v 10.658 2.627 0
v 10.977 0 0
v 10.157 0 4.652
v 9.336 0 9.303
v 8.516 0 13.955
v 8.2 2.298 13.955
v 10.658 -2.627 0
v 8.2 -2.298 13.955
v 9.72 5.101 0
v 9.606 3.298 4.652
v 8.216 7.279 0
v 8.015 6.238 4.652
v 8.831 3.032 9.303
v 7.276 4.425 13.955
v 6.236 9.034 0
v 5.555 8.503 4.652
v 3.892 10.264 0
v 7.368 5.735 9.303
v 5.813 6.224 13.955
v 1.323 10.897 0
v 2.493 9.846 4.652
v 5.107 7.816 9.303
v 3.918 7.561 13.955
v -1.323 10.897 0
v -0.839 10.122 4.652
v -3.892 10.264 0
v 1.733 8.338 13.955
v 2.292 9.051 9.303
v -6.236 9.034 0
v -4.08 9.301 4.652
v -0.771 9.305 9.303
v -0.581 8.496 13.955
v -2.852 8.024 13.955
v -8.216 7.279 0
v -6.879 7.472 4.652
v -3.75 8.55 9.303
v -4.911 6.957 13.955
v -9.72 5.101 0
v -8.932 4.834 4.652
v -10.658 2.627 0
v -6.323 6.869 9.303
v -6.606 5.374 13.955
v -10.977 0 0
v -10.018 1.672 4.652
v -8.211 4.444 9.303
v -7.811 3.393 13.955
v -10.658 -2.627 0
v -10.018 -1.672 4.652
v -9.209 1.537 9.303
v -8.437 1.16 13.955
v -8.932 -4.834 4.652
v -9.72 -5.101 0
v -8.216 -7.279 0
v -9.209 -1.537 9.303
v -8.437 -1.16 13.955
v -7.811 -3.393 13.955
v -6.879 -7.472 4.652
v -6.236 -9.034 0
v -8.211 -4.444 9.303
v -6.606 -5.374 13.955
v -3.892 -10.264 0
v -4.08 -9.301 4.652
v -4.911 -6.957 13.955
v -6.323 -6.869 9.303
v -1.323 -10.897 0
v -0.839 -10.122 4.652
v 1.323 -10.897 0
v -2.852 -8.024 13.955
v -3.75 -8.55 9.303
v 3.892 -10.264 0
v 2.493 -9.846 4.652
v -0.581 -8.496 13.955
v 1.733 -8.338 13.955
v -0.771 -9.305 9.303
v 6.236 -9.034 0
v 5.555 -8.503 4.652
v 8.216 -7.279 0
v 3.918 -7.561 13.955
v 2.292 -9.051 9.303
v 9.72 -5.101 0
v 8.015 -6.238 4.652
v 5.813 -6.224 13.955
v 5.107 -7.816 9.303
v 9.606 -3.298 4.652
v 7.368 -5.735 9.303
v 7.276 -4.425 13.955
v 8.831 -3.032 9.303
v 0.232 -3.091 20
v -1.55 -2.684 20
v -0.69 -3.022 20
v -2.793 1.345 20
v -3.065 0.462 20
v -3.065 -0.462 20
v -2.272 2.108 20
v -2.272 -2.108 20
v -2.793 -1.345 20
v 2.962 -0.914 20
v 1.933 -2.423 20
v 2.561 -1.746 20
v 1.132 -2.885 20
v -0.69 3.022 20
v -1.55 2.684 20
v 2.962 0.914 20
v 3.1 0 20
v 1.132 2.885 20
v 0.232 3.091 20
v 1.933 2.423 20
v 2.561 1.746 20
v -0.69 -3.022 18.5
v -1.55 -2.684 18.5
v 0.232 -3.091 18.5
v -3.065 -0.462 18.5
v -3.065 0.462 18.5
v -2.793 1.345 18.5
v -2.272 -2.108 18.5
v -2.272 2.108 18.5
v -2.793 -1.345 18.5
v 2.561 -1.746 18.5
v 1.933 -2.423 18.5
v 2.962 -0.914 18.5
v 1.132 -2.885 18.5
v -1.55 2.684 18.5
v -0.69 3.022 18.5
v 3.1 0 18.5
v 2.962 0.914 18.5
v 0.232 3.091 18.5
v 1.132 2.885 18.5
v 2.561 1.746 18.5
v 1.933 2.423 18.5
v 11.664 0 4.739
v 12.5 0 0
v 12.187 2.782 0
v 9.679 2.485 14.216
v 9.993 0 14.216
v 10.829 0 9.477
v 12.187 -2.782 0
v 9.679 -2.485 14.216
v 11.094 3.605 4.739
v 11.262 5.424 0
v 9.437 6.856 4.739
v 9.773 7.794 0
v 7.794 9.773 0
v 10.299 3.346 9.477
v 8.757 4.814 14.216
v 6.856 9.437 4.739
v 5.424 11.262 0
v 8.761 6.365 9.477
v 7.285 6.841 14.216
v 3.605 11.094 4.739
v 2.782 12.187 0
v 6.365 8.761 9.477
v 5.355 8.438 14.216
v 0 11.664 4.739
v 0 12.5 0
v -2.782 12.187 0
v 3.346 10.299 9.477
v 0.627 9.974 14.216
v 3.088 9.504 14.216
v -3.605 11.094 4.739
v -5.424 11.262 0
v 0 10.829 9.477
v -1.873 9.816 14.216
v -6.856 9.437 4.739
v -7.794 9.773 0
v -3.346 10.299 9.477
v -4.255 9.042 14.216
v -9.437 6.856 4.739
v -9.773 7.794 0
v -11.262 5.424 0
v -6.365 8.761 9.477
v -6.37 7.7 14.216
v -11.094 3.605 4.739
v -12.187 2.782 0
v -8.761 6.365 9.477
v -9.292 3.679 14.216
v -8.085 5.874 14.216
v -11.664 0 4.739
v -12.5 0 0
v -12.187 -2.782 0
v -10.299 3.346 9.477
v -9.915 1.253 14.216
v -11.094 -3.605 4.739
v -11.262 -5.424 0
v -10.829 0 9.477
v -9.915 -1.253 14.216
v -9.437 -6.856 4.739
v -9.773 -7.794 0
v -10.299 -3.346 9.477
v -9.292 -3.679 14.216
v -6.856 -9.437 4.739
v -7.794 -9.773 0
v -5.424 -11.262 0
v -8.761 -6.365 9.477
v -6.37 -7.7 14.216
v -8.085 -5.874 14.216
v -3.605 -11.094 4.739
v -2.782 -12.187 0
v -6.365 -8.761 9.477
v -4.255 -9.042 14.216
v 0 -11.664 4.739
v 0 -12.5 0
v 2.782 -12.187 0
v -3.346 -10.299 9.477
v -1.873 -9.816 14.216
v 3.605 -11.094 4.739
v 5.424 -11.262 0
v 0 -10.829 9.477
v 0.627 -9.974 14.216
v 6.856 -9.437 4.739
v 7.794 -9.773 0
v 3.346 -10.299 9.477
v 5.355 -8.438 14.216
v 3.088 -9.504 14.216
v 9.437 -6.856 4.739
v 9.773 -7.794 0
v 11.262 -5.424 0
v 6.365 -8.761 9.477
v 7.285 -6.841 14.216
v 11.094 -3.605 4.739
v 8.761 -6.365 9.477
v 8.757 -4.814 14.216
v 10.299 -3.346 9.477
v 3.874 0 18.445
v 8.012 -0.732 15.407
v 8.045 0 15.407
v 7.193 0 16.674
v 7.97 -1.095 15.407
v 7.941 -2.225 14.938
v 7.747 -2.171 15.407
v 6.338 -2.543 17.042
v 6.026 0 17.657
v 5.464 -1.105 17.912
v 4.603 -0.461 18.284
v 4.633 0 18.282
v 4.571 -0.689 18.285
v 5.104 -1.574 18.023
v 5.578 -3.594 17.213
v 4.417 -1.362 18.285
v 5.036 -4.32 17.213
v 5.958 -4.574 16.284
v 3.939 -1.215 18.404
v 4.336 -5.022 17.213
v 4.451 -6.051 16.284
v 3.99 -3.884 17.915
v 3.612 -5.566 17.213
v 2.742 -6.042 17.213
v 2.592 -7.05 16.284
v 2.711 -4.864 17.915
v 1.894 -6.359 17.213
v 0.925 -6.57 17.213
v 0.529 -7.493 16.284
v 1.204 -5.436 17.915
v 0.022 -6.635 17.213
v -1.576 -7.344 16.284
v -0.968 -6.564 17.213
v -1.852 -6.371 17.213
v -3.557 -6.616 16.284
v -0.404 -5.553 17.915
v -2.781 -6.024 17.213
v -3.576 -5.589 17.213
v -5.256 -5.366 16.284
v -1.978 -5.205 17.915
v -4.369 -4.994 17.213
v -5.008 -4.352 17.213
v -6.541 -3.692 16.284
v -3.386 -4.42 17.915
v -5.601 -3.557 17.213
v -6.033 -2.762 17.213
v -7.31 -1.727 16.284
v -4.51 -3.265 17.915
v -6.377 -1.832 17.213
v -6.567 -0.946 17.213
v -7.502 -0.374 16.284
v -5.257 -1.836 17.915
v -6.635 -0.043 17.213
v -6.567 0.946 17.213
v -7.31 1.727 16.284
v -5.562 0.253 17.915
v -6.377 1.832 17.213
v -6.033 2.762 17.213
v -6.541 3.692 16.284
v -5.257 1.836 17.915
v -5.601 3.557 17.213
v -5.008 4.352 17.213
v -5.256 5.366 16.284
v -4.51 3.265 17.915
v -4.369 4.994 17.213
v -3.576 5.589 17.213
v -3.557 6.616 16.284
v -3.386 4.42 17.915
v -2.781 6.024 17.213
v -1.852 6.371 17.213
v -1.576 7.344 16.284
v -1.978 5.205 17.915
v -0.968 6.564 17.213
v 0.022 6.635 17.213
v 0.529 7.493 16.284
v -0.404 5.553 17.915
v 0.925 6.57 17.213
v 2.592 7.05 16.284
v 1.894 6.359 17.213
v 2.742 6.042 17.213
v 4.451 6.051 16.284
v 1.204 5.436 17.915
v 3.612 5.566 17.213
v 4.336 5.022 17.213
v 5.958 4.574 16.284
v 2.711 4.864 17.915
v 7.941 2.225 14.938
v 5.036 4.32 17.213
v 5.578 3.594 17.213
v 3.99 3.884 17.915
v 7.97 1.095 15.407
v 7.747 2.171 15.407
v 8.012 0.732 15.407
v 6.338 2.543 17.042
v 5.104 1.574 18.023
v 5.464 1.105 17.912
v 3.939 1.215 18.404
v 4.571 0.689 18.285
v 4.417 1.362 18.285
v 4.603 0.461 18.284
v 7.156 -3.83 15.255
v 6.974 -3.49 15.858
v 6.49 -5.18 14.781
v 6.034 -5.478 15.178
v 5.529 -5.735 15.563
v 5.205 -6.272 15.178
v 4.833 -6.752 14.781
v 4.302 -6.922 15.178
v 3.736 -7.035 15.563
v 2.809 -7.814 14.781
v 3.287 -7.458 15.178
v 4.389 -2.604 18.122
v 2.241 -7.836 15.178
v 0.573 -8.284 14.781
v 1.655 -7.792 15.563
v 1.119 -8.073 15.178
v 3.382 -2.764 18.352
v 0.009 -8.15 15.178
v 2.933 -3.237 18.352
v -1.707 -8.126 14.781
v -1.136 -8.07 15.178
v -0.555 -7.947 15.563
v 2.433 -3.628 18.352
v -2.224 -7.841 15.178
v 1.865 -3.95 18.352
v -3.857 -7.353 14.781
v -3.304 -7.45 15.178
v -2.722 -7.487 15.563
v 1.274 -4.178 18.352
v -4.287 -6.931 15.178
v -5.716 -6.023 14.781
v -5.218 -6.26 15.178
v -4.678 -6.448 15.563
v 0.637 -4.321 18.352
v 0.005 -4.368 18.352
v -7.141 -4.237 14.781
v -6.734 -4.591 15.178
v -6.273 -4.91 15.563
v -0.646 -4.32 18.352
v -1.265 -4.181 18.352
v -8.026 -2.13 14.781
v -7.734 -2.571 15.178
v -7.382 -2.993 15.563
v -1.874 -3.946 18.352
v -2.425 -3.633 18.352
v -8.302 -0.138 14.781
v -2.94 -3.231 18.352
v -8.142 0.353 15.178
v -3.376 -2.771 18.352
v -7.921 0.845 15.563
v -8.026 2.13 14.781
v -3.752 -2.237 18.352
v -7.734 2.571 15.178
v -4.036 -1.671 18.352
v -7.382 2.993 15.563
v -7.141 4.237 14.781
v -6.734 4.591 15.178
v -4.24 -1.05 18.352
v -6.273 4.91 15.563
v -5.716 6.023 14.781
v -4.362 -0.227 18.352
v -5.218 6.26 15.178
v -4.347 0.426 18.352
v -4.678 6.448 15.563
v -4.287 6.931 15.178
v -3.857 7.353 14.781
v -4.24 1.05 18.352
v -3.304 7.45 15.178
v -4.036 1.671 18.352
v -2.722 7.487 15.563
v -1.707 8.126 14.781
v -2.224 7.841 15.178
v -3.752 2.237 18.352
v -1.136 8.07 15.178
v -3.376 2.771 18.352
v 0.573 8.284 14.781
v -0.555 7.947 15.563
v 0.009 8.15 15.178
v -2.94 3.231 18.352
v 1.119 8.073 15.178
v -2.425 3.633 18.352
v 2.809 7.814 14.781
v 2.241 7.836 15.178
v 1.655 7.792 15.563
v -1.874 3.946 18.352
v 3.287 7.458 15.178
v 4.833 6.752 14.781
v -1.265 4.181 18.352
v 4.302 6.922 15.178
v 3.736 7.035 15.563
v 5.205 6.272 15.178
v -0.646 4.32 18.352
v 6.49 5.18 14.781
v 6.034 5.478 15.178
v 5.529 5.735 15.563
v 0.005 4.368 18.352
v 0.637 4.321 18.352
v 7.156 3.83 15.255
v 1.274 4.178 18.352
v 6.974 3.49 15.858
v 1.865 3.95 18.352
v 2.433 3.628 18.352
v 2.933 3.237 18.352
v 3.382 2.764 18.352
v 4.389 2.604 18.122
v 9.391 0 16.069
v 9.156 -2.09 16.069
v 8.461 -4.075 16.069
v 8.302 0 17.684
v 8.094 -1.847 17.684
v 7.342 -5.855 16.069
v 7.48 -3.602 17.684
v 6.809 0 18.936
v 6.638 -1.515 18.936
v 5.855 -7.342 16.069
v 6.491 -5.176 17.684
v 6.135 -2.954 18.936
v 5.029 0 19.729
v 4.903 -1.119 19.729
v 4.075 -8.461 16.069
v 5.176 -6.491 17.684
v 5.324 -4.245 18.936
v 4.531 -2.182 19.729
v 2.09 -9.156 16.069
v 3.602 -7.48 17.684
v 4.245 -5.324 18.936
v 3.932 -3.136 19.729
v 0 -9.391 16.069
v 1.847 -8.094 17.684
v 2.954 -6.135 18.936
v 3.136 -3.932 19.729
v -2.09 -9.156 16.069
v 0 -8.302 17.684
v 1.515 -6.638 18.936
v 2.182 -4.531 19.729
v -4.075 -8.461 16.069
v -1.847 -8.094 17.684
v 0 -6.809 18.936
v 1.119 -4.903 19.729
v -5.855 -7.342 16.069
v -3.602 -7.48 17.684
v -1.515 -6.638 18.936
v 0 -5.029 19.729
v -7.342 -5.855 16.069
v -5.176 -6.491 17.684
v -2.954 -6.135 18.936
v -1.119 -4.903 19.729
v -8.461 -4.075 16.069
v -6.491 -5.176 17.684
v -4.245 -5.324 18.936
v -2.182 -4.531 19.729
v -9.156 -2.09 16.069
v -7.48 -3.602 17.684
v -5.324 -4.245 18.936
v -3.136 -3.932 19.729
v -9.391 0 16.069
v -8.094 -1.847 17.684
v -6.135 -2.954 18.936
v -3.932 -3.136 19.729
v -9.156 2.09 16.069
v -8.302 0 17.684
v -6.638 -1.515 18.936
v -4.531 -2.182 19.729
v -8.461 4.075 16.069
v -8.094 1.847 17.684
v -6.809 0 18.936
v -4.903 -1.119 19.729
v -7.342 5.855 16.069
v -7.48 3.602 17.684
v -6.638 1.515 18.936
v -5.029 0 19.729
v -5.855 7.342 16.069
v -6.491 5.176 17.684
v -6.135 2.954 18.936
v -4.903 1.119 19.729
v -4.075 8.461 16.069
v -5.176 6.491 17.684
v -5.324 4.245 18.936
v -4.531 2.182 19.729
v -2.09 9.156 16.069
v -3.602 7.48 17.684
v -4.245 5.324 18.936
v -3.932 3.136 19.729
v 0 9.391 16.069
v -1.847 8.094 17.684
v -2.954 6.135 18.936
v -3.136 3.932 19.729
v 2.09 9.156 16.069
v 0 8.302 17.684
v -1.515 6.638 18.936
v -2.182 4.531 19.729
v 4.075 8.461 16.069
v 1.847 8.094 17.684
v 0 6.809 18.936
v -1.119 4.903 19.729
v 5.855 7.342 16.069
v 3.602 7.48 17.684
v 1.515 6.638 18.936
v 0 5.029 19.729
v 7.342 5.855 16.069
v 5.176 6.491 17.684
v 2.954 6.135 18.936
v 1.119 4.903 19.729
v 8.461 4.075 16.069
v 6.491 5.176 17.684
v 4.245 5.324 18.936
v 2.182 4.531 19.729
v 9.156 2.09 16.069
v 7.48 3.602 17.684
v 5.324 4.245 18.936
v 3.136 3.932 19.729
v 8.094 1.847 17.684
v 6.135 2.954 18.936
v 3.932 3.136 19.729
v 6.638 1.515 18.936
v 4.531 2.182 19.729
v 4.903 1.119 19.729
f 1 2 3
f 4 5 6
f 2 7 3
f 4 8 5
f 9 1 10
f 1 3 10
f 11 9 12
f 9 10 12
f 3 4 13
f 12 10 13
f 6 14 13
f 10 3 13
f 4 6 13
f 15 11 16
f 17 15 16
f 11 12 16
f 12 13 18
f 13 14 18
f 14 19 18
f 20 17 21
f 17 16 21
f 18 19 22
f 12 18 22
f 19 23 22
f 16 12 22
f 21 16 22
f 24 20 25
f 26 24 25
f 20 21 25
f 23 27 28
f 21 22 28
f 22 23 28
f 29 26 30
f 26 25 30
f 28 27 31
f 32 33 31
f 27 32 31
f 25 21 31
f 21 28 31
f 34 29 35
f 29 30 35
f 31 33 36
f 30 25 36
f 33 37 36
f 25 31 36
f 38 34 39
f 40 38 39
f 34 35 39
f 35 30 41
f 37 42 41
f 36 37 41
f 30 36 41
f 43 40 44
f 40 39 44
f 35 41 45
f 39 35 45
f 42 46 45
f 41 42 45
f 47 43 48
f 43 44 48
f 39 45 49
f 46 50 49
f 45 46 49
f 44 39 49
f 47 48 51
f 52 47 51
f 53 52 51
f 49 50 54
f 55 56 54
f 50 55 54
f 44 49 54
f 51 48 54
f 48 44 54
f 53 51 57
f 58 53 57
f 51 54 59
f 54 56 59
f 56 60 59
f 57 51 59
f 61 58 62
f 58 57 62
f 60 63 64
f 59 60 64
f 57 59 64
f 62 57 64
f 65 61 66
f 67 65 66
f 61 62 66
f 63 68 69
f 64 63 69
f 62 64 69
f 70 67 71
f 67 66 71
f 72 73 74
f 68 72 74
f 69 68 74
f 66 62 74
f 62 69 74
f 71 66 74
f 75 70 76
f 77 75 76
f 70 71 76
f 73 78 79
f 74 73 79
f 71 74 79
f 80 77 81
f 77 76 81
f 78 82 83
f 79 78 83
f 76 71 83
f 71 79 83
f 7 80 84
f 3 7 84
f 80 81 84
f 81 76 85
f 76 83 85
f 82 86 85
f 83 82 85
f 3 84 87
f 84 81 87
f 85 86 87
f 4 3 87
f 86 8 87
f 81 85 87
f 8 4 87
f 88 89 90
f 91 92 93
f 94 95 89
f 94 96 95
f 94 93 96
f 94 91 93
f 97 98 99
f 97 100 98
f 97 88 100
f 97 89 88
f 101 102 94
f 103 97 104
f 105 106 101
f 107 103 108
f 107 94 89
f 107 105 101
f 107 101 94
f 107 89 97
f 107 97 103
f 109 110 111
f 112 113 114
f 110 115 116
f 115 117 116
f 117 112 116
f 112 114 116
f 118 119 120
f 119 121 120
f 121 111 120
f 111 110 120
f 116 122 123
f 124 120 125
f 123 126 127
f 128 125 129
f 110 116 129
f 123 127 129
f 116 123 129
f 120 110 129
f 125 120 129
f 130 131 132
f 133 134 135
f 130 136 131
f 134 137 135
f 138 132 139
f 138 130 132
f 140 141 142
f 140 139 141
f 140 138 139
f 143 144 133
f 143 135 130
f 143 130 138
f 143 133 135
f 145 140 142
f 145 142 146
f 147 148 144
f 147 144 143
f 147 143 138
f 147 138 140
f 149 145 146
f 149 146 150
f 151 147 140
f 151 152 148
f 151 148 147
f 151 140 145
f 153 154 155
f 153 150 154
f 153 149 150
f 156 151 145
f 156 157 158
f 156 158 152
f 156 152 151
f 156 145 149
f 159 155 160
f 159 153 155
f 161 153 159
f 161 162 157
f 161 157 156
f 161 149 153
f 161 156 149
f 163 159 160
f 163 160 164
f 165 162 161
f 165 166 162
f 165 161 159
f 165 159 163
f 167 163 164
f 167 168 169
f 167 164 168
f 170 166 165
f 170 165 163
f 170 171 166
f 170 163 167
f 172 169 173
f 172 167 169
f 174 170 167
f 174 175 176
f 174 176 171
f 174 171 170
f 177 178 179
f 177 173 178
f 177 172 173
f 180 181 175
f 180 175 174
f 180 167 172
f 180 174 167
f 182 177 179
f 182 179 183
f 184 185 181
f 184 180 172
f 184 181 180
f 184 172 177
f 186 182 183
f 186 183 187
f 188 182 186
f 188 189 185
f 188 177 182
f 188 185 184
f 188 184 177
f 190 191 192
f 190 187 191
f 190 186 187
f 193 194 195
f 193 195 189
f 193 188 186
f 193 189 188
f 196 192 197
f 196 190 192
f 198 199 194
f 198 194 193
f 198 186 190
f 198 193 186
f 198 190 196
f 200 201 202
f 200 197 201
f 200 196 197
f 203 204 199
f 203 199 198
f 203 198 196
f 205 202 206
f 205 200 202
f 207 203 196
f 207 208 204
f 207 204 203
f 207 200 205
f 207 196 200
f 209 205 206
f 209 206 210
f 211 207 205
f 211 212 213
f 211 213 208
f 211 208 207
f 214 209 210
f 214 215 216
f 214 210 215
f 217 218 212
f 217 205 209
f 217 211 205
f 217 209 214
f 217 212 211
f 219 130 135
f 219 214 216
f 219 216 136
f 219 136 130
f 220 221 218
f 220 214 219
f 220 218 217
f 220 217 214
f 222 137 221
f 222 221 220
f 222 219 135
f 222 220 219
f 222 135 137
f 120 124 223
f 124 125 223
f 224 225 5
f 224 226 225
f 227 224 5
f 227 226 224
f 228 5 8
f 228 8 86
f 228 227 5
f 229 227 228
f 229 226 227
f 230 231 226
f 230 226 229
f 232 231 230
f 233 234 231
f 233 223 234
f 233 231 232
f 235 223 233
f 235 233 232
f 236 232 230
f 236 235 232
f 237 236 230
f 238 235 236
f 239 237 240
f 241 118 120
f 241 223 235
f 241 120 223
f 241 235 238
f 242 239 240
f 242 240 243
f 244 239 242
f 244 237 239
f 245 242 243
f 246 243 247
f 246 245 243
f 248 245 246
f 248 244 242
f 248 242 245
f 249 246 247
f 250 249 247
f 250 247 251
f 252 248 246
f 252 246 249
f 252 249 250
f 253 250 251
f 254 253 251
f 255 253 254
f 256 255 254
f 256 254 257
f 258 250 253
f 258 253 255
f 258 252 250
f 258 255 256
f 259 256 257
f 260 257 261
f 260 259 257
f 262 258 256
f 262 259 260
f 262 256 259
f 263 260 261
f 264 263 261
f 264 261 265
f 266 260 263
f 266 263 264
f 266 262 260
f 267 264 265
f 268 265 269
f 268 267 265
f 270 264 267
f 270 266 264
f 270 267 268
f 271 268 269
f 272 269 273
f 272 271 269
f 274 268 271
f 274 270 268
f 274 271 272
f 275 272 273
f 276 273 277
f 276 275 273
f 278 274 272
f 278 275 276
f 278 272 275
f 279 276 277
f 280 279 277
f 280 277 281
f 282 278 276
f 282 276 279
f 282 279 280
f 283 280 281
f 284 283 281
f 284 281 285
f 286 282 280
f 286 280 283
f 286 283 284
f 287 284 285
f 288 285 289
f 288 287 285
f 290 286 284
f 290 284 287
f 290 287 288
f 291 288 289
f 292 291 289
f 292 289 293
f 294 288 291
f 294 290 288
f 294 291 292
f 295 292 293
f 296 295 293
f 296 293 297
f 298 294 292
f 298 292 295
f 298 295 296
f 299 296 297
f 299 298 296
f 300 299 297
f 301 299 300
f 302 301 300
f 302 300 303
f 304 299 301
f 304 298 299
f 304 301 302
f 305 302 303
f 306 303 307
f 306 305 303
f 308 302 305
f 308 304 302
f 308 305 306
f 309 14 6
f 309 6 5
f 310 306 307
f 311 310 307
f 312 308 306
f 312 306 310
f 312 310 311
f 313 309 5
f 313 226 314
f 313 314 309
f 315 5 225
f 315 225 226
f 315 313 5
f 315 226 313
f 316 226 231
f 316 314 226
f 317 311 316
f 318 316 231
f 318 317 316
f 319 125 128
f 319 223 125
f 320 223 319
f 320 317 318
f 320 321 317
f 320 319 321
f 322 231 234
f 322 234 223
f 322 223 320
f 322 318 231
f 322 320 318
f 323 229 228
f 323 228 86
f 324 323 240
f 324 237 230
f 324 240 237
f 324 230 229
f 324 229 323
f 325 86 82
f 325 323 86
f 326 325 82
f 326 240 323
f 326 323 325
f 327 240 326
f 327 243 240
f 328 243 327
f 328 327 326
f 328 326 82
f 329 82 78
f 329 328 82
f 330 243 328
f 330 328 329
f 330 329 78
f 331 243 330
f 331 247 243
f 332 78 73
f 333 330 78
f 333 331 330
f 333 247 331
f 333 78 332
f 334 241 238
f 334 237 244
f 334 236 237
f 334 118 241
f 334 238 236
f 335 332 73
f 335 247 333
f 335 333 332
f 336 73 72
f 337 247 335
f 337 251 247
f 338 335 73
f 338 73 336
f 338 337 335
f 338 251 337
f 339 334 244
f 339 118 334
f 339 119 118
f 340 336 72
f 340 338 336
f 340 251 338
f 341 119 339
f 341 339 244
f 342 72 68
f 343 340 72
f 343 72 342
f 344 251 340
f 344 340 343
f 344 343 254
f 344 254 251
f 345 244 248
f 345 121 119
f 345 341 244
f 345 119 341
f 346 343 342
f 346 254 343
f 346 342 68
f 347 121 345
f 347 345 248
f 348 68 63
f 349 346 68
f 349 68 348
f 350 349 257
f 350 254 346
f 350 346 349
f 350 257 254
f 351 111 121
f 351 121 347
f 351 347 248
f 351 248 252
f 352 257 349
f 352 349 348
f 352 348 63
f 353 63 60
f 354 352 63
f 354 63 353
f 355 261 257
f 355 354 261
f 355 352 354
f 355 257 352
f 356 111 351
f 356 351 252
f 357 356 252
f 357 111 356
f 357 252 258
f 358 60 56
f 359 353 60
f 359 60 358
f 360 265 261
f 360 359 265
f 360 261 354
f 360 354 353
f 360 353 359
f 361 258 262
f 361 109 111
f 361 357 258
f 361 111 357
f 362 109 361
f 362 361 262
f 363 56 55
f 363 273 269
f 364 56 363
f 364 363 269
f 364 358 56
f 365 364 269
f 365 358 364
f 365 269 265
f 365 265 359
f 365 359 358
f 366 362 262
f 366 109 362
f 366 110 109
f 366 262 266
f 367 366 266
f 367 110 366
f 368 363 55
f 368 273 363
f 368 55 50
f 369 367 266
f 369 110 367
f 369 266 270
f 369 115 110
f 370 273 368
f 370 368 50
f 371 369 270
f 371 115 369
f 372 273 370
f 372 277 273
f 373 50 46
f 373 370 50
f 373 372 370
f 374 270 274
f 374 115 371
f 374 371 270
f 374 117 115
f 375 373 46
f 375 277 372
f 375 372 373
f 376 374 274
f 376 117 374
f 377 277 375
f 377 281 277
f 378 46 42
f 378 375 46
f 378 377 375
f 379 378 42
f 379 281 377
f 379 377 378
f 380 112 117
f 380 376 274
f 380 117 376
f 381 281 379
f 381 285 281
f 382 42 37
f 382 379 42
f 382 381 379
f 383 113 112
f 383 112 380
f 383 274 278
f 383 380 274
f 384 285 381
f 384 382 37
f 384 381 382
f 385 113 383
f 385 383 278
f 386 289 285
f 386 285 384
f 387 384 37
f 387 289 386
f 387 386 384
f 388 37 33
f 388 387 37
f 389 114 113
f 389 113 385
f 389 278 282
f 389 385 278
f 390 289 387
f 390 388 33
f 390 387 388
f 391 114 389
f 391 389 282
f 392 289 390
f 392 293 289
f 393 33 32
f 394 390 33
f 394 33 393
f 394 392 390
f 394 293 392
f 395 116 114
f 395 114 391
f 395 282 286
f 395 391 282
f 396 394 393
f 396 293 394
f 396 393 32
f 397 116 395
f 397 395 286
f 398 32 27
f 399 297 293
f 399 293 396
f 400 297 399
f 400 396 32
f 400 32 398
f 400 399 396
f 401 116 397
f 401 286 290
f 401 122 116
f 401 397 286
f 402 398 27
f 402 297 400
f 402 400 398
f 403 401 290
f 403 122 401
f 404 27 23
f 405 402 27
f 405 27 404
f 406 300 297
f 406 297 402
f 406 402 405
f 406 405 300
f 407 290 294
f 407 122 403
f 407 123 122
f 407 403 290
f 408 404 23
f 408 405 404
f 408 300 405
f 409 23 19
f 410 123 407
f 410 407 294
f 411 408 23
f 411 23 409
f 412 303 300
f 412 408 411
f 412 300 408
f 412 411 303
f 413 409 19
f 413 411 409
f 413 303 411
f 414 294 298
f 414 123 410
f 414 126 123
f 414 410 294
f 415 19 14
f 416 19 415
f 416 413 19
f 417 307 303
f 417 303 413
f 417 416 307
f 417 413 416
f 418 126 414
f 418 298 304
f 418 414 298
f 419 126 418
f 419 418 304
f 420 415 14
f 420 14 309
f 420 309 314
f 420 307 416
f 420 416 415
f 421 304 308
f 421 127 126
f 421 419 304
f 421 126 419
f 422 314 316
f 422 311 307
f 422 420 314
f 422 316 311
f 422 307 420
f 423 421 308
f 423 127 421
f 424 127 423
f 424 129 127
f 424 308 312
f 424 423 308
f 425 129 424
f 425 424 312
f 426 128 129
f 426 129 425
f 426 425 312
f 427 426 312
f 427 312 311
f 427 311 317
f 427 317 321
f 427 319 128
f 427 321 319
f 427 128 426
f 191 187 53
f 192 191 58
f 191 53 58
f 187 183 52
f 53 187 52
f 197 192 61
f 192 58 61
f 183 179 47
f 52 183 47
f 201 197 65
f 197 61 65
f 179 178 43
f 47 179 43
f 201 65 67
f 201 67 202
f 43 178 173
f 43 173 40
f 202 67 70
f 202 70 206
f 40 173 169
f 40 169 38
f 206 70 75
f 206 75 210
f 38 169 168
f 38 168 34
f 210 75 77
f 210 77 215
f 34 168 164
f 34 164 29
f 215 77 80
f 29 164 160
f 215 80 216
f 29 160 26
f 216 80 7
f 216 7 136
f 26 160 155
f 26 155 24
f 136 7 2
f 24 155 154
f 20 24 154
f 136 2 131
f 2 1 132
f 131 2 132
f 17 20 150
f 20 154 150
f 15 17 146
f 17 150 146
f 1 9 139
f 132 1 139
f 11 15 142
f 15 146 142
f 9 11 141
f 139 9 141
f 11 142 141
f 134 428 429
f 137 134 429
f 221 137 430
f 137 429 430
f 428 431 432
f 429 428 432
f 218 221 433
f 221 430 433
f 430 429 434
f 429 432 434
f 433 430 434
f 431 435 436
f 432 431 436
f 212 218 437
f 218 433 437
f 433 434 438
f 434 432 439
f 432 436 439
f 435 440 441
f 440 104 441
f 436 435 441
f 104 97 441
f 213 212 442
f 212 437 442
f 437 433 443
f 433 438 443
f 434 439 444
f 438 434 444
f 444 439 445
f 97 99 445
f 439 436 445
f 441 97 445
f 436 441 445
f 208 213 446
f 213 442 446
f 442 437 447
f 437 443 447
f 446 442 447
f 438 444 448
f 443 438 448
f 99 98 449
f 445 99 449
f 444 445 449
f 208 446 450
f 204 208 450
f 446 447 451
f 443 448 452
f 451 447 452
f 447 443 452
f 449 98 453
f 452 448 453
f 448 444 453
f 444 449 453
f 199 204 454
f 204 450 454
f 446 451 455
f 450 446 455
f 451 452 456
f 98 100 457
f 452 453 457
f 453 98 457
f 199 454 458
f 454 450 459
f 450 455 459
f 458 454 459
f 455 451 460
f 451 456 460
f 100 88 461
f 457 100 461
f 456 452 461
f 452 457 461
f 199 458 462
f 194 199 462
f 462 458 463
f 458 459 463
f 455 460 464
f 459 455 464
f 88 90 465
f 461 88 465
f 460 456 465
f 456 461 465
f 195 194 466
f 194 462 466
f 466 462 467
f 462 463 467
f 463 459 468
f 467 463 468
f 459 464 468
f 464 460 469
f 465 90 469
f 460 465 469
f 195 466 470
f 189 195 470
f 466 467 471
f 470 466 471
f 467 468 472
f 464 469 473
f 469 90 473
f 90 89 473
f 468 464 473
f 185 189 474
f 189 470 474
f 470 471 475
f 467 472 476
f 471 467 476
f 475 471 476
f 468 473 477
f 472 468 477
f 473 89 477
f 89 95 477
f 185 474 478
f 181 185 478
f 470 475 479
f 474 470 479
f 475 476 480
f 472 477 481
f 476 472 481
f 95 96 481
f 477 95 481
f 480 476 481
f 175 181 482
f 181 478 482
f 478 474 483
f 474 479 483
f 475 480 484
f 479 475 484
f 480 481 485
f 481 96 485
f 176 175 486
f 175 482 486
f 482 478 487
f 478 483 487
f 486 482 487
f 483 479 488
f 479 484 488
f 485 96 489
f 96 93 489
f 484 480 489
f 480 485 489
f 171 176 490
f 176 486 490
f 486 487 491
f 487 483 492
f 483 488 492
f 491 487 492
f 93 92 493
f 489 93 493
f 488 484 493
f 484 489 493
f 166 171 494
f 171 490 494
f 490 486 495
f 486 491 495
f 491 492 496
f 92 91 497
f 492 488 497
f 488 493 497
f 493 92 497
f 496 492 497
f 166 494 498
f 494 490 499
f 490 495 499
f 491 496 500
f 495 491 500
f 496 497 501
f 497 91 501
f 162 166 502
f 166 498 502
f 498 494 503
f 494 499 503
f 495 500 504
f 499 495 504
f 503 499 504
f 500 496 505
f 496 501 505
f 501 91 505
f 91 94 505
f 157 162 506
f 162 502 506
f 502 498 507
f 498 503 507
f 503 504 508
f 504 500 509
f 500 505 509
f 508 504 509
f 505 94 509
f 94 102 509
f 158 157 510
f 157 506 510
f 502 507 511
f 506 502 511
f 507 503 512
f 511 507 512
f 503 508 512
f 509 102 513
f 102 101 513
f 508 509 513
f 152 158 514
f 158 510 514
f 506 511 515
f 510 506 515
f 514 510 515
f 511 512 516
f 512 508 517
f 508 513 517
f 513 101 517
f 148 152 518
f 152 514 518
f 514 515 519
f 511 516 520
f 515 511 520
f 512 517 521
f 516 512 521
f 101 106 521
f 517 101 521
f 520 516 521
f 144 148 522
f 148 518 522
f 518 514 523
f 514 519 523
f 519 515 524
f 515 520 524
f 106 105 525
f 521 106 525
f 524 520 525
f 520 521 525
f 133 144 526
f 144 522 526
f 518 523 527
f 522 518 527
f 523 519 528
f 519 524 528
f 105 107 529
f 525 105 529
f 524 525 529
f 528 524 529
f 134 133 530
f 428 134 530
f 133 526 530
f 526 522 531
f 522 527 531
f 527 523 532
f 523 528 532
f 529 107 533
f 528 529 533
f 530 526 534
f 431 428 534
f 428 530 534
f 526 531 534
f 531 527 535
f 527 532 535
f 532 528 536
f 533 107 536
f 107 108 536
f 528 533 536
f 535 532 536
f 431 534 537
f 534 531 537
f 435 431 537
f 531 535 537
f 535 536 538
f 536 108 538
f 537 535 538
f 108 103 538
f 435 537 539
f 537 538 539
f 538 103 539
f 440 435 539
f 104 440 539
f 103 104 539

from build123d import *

# Parameters (mm, degrees)
F0_R     = 12.5
F1_DEPTH = 20
F1_TAPER = 10
F2_R     = 7
F3_T     = -1.5


with BuildPart() as f1:
    # F0 (on Top) → F1 (new body)
    with BuildSketch(Plane.XY):
        Circle(F0_R)
    extrude(amount=F1_DEPTH, taper=F1_TAPER)

    # F2
    f2_edges = [f1.edges().sort_by_distance(p)[0] for p in [
        (-8.97346, 0, 20),
    ]]
    fillet(f2_edges, radius=F2_R)

    # F3
    f3_openings = [f1.faces().sort_by_distance(p)[0] for p in [
        (0, 0, 0),
    ]]
    offset(amount=F3_T, openings=f3_openings)


solid = f1.part
